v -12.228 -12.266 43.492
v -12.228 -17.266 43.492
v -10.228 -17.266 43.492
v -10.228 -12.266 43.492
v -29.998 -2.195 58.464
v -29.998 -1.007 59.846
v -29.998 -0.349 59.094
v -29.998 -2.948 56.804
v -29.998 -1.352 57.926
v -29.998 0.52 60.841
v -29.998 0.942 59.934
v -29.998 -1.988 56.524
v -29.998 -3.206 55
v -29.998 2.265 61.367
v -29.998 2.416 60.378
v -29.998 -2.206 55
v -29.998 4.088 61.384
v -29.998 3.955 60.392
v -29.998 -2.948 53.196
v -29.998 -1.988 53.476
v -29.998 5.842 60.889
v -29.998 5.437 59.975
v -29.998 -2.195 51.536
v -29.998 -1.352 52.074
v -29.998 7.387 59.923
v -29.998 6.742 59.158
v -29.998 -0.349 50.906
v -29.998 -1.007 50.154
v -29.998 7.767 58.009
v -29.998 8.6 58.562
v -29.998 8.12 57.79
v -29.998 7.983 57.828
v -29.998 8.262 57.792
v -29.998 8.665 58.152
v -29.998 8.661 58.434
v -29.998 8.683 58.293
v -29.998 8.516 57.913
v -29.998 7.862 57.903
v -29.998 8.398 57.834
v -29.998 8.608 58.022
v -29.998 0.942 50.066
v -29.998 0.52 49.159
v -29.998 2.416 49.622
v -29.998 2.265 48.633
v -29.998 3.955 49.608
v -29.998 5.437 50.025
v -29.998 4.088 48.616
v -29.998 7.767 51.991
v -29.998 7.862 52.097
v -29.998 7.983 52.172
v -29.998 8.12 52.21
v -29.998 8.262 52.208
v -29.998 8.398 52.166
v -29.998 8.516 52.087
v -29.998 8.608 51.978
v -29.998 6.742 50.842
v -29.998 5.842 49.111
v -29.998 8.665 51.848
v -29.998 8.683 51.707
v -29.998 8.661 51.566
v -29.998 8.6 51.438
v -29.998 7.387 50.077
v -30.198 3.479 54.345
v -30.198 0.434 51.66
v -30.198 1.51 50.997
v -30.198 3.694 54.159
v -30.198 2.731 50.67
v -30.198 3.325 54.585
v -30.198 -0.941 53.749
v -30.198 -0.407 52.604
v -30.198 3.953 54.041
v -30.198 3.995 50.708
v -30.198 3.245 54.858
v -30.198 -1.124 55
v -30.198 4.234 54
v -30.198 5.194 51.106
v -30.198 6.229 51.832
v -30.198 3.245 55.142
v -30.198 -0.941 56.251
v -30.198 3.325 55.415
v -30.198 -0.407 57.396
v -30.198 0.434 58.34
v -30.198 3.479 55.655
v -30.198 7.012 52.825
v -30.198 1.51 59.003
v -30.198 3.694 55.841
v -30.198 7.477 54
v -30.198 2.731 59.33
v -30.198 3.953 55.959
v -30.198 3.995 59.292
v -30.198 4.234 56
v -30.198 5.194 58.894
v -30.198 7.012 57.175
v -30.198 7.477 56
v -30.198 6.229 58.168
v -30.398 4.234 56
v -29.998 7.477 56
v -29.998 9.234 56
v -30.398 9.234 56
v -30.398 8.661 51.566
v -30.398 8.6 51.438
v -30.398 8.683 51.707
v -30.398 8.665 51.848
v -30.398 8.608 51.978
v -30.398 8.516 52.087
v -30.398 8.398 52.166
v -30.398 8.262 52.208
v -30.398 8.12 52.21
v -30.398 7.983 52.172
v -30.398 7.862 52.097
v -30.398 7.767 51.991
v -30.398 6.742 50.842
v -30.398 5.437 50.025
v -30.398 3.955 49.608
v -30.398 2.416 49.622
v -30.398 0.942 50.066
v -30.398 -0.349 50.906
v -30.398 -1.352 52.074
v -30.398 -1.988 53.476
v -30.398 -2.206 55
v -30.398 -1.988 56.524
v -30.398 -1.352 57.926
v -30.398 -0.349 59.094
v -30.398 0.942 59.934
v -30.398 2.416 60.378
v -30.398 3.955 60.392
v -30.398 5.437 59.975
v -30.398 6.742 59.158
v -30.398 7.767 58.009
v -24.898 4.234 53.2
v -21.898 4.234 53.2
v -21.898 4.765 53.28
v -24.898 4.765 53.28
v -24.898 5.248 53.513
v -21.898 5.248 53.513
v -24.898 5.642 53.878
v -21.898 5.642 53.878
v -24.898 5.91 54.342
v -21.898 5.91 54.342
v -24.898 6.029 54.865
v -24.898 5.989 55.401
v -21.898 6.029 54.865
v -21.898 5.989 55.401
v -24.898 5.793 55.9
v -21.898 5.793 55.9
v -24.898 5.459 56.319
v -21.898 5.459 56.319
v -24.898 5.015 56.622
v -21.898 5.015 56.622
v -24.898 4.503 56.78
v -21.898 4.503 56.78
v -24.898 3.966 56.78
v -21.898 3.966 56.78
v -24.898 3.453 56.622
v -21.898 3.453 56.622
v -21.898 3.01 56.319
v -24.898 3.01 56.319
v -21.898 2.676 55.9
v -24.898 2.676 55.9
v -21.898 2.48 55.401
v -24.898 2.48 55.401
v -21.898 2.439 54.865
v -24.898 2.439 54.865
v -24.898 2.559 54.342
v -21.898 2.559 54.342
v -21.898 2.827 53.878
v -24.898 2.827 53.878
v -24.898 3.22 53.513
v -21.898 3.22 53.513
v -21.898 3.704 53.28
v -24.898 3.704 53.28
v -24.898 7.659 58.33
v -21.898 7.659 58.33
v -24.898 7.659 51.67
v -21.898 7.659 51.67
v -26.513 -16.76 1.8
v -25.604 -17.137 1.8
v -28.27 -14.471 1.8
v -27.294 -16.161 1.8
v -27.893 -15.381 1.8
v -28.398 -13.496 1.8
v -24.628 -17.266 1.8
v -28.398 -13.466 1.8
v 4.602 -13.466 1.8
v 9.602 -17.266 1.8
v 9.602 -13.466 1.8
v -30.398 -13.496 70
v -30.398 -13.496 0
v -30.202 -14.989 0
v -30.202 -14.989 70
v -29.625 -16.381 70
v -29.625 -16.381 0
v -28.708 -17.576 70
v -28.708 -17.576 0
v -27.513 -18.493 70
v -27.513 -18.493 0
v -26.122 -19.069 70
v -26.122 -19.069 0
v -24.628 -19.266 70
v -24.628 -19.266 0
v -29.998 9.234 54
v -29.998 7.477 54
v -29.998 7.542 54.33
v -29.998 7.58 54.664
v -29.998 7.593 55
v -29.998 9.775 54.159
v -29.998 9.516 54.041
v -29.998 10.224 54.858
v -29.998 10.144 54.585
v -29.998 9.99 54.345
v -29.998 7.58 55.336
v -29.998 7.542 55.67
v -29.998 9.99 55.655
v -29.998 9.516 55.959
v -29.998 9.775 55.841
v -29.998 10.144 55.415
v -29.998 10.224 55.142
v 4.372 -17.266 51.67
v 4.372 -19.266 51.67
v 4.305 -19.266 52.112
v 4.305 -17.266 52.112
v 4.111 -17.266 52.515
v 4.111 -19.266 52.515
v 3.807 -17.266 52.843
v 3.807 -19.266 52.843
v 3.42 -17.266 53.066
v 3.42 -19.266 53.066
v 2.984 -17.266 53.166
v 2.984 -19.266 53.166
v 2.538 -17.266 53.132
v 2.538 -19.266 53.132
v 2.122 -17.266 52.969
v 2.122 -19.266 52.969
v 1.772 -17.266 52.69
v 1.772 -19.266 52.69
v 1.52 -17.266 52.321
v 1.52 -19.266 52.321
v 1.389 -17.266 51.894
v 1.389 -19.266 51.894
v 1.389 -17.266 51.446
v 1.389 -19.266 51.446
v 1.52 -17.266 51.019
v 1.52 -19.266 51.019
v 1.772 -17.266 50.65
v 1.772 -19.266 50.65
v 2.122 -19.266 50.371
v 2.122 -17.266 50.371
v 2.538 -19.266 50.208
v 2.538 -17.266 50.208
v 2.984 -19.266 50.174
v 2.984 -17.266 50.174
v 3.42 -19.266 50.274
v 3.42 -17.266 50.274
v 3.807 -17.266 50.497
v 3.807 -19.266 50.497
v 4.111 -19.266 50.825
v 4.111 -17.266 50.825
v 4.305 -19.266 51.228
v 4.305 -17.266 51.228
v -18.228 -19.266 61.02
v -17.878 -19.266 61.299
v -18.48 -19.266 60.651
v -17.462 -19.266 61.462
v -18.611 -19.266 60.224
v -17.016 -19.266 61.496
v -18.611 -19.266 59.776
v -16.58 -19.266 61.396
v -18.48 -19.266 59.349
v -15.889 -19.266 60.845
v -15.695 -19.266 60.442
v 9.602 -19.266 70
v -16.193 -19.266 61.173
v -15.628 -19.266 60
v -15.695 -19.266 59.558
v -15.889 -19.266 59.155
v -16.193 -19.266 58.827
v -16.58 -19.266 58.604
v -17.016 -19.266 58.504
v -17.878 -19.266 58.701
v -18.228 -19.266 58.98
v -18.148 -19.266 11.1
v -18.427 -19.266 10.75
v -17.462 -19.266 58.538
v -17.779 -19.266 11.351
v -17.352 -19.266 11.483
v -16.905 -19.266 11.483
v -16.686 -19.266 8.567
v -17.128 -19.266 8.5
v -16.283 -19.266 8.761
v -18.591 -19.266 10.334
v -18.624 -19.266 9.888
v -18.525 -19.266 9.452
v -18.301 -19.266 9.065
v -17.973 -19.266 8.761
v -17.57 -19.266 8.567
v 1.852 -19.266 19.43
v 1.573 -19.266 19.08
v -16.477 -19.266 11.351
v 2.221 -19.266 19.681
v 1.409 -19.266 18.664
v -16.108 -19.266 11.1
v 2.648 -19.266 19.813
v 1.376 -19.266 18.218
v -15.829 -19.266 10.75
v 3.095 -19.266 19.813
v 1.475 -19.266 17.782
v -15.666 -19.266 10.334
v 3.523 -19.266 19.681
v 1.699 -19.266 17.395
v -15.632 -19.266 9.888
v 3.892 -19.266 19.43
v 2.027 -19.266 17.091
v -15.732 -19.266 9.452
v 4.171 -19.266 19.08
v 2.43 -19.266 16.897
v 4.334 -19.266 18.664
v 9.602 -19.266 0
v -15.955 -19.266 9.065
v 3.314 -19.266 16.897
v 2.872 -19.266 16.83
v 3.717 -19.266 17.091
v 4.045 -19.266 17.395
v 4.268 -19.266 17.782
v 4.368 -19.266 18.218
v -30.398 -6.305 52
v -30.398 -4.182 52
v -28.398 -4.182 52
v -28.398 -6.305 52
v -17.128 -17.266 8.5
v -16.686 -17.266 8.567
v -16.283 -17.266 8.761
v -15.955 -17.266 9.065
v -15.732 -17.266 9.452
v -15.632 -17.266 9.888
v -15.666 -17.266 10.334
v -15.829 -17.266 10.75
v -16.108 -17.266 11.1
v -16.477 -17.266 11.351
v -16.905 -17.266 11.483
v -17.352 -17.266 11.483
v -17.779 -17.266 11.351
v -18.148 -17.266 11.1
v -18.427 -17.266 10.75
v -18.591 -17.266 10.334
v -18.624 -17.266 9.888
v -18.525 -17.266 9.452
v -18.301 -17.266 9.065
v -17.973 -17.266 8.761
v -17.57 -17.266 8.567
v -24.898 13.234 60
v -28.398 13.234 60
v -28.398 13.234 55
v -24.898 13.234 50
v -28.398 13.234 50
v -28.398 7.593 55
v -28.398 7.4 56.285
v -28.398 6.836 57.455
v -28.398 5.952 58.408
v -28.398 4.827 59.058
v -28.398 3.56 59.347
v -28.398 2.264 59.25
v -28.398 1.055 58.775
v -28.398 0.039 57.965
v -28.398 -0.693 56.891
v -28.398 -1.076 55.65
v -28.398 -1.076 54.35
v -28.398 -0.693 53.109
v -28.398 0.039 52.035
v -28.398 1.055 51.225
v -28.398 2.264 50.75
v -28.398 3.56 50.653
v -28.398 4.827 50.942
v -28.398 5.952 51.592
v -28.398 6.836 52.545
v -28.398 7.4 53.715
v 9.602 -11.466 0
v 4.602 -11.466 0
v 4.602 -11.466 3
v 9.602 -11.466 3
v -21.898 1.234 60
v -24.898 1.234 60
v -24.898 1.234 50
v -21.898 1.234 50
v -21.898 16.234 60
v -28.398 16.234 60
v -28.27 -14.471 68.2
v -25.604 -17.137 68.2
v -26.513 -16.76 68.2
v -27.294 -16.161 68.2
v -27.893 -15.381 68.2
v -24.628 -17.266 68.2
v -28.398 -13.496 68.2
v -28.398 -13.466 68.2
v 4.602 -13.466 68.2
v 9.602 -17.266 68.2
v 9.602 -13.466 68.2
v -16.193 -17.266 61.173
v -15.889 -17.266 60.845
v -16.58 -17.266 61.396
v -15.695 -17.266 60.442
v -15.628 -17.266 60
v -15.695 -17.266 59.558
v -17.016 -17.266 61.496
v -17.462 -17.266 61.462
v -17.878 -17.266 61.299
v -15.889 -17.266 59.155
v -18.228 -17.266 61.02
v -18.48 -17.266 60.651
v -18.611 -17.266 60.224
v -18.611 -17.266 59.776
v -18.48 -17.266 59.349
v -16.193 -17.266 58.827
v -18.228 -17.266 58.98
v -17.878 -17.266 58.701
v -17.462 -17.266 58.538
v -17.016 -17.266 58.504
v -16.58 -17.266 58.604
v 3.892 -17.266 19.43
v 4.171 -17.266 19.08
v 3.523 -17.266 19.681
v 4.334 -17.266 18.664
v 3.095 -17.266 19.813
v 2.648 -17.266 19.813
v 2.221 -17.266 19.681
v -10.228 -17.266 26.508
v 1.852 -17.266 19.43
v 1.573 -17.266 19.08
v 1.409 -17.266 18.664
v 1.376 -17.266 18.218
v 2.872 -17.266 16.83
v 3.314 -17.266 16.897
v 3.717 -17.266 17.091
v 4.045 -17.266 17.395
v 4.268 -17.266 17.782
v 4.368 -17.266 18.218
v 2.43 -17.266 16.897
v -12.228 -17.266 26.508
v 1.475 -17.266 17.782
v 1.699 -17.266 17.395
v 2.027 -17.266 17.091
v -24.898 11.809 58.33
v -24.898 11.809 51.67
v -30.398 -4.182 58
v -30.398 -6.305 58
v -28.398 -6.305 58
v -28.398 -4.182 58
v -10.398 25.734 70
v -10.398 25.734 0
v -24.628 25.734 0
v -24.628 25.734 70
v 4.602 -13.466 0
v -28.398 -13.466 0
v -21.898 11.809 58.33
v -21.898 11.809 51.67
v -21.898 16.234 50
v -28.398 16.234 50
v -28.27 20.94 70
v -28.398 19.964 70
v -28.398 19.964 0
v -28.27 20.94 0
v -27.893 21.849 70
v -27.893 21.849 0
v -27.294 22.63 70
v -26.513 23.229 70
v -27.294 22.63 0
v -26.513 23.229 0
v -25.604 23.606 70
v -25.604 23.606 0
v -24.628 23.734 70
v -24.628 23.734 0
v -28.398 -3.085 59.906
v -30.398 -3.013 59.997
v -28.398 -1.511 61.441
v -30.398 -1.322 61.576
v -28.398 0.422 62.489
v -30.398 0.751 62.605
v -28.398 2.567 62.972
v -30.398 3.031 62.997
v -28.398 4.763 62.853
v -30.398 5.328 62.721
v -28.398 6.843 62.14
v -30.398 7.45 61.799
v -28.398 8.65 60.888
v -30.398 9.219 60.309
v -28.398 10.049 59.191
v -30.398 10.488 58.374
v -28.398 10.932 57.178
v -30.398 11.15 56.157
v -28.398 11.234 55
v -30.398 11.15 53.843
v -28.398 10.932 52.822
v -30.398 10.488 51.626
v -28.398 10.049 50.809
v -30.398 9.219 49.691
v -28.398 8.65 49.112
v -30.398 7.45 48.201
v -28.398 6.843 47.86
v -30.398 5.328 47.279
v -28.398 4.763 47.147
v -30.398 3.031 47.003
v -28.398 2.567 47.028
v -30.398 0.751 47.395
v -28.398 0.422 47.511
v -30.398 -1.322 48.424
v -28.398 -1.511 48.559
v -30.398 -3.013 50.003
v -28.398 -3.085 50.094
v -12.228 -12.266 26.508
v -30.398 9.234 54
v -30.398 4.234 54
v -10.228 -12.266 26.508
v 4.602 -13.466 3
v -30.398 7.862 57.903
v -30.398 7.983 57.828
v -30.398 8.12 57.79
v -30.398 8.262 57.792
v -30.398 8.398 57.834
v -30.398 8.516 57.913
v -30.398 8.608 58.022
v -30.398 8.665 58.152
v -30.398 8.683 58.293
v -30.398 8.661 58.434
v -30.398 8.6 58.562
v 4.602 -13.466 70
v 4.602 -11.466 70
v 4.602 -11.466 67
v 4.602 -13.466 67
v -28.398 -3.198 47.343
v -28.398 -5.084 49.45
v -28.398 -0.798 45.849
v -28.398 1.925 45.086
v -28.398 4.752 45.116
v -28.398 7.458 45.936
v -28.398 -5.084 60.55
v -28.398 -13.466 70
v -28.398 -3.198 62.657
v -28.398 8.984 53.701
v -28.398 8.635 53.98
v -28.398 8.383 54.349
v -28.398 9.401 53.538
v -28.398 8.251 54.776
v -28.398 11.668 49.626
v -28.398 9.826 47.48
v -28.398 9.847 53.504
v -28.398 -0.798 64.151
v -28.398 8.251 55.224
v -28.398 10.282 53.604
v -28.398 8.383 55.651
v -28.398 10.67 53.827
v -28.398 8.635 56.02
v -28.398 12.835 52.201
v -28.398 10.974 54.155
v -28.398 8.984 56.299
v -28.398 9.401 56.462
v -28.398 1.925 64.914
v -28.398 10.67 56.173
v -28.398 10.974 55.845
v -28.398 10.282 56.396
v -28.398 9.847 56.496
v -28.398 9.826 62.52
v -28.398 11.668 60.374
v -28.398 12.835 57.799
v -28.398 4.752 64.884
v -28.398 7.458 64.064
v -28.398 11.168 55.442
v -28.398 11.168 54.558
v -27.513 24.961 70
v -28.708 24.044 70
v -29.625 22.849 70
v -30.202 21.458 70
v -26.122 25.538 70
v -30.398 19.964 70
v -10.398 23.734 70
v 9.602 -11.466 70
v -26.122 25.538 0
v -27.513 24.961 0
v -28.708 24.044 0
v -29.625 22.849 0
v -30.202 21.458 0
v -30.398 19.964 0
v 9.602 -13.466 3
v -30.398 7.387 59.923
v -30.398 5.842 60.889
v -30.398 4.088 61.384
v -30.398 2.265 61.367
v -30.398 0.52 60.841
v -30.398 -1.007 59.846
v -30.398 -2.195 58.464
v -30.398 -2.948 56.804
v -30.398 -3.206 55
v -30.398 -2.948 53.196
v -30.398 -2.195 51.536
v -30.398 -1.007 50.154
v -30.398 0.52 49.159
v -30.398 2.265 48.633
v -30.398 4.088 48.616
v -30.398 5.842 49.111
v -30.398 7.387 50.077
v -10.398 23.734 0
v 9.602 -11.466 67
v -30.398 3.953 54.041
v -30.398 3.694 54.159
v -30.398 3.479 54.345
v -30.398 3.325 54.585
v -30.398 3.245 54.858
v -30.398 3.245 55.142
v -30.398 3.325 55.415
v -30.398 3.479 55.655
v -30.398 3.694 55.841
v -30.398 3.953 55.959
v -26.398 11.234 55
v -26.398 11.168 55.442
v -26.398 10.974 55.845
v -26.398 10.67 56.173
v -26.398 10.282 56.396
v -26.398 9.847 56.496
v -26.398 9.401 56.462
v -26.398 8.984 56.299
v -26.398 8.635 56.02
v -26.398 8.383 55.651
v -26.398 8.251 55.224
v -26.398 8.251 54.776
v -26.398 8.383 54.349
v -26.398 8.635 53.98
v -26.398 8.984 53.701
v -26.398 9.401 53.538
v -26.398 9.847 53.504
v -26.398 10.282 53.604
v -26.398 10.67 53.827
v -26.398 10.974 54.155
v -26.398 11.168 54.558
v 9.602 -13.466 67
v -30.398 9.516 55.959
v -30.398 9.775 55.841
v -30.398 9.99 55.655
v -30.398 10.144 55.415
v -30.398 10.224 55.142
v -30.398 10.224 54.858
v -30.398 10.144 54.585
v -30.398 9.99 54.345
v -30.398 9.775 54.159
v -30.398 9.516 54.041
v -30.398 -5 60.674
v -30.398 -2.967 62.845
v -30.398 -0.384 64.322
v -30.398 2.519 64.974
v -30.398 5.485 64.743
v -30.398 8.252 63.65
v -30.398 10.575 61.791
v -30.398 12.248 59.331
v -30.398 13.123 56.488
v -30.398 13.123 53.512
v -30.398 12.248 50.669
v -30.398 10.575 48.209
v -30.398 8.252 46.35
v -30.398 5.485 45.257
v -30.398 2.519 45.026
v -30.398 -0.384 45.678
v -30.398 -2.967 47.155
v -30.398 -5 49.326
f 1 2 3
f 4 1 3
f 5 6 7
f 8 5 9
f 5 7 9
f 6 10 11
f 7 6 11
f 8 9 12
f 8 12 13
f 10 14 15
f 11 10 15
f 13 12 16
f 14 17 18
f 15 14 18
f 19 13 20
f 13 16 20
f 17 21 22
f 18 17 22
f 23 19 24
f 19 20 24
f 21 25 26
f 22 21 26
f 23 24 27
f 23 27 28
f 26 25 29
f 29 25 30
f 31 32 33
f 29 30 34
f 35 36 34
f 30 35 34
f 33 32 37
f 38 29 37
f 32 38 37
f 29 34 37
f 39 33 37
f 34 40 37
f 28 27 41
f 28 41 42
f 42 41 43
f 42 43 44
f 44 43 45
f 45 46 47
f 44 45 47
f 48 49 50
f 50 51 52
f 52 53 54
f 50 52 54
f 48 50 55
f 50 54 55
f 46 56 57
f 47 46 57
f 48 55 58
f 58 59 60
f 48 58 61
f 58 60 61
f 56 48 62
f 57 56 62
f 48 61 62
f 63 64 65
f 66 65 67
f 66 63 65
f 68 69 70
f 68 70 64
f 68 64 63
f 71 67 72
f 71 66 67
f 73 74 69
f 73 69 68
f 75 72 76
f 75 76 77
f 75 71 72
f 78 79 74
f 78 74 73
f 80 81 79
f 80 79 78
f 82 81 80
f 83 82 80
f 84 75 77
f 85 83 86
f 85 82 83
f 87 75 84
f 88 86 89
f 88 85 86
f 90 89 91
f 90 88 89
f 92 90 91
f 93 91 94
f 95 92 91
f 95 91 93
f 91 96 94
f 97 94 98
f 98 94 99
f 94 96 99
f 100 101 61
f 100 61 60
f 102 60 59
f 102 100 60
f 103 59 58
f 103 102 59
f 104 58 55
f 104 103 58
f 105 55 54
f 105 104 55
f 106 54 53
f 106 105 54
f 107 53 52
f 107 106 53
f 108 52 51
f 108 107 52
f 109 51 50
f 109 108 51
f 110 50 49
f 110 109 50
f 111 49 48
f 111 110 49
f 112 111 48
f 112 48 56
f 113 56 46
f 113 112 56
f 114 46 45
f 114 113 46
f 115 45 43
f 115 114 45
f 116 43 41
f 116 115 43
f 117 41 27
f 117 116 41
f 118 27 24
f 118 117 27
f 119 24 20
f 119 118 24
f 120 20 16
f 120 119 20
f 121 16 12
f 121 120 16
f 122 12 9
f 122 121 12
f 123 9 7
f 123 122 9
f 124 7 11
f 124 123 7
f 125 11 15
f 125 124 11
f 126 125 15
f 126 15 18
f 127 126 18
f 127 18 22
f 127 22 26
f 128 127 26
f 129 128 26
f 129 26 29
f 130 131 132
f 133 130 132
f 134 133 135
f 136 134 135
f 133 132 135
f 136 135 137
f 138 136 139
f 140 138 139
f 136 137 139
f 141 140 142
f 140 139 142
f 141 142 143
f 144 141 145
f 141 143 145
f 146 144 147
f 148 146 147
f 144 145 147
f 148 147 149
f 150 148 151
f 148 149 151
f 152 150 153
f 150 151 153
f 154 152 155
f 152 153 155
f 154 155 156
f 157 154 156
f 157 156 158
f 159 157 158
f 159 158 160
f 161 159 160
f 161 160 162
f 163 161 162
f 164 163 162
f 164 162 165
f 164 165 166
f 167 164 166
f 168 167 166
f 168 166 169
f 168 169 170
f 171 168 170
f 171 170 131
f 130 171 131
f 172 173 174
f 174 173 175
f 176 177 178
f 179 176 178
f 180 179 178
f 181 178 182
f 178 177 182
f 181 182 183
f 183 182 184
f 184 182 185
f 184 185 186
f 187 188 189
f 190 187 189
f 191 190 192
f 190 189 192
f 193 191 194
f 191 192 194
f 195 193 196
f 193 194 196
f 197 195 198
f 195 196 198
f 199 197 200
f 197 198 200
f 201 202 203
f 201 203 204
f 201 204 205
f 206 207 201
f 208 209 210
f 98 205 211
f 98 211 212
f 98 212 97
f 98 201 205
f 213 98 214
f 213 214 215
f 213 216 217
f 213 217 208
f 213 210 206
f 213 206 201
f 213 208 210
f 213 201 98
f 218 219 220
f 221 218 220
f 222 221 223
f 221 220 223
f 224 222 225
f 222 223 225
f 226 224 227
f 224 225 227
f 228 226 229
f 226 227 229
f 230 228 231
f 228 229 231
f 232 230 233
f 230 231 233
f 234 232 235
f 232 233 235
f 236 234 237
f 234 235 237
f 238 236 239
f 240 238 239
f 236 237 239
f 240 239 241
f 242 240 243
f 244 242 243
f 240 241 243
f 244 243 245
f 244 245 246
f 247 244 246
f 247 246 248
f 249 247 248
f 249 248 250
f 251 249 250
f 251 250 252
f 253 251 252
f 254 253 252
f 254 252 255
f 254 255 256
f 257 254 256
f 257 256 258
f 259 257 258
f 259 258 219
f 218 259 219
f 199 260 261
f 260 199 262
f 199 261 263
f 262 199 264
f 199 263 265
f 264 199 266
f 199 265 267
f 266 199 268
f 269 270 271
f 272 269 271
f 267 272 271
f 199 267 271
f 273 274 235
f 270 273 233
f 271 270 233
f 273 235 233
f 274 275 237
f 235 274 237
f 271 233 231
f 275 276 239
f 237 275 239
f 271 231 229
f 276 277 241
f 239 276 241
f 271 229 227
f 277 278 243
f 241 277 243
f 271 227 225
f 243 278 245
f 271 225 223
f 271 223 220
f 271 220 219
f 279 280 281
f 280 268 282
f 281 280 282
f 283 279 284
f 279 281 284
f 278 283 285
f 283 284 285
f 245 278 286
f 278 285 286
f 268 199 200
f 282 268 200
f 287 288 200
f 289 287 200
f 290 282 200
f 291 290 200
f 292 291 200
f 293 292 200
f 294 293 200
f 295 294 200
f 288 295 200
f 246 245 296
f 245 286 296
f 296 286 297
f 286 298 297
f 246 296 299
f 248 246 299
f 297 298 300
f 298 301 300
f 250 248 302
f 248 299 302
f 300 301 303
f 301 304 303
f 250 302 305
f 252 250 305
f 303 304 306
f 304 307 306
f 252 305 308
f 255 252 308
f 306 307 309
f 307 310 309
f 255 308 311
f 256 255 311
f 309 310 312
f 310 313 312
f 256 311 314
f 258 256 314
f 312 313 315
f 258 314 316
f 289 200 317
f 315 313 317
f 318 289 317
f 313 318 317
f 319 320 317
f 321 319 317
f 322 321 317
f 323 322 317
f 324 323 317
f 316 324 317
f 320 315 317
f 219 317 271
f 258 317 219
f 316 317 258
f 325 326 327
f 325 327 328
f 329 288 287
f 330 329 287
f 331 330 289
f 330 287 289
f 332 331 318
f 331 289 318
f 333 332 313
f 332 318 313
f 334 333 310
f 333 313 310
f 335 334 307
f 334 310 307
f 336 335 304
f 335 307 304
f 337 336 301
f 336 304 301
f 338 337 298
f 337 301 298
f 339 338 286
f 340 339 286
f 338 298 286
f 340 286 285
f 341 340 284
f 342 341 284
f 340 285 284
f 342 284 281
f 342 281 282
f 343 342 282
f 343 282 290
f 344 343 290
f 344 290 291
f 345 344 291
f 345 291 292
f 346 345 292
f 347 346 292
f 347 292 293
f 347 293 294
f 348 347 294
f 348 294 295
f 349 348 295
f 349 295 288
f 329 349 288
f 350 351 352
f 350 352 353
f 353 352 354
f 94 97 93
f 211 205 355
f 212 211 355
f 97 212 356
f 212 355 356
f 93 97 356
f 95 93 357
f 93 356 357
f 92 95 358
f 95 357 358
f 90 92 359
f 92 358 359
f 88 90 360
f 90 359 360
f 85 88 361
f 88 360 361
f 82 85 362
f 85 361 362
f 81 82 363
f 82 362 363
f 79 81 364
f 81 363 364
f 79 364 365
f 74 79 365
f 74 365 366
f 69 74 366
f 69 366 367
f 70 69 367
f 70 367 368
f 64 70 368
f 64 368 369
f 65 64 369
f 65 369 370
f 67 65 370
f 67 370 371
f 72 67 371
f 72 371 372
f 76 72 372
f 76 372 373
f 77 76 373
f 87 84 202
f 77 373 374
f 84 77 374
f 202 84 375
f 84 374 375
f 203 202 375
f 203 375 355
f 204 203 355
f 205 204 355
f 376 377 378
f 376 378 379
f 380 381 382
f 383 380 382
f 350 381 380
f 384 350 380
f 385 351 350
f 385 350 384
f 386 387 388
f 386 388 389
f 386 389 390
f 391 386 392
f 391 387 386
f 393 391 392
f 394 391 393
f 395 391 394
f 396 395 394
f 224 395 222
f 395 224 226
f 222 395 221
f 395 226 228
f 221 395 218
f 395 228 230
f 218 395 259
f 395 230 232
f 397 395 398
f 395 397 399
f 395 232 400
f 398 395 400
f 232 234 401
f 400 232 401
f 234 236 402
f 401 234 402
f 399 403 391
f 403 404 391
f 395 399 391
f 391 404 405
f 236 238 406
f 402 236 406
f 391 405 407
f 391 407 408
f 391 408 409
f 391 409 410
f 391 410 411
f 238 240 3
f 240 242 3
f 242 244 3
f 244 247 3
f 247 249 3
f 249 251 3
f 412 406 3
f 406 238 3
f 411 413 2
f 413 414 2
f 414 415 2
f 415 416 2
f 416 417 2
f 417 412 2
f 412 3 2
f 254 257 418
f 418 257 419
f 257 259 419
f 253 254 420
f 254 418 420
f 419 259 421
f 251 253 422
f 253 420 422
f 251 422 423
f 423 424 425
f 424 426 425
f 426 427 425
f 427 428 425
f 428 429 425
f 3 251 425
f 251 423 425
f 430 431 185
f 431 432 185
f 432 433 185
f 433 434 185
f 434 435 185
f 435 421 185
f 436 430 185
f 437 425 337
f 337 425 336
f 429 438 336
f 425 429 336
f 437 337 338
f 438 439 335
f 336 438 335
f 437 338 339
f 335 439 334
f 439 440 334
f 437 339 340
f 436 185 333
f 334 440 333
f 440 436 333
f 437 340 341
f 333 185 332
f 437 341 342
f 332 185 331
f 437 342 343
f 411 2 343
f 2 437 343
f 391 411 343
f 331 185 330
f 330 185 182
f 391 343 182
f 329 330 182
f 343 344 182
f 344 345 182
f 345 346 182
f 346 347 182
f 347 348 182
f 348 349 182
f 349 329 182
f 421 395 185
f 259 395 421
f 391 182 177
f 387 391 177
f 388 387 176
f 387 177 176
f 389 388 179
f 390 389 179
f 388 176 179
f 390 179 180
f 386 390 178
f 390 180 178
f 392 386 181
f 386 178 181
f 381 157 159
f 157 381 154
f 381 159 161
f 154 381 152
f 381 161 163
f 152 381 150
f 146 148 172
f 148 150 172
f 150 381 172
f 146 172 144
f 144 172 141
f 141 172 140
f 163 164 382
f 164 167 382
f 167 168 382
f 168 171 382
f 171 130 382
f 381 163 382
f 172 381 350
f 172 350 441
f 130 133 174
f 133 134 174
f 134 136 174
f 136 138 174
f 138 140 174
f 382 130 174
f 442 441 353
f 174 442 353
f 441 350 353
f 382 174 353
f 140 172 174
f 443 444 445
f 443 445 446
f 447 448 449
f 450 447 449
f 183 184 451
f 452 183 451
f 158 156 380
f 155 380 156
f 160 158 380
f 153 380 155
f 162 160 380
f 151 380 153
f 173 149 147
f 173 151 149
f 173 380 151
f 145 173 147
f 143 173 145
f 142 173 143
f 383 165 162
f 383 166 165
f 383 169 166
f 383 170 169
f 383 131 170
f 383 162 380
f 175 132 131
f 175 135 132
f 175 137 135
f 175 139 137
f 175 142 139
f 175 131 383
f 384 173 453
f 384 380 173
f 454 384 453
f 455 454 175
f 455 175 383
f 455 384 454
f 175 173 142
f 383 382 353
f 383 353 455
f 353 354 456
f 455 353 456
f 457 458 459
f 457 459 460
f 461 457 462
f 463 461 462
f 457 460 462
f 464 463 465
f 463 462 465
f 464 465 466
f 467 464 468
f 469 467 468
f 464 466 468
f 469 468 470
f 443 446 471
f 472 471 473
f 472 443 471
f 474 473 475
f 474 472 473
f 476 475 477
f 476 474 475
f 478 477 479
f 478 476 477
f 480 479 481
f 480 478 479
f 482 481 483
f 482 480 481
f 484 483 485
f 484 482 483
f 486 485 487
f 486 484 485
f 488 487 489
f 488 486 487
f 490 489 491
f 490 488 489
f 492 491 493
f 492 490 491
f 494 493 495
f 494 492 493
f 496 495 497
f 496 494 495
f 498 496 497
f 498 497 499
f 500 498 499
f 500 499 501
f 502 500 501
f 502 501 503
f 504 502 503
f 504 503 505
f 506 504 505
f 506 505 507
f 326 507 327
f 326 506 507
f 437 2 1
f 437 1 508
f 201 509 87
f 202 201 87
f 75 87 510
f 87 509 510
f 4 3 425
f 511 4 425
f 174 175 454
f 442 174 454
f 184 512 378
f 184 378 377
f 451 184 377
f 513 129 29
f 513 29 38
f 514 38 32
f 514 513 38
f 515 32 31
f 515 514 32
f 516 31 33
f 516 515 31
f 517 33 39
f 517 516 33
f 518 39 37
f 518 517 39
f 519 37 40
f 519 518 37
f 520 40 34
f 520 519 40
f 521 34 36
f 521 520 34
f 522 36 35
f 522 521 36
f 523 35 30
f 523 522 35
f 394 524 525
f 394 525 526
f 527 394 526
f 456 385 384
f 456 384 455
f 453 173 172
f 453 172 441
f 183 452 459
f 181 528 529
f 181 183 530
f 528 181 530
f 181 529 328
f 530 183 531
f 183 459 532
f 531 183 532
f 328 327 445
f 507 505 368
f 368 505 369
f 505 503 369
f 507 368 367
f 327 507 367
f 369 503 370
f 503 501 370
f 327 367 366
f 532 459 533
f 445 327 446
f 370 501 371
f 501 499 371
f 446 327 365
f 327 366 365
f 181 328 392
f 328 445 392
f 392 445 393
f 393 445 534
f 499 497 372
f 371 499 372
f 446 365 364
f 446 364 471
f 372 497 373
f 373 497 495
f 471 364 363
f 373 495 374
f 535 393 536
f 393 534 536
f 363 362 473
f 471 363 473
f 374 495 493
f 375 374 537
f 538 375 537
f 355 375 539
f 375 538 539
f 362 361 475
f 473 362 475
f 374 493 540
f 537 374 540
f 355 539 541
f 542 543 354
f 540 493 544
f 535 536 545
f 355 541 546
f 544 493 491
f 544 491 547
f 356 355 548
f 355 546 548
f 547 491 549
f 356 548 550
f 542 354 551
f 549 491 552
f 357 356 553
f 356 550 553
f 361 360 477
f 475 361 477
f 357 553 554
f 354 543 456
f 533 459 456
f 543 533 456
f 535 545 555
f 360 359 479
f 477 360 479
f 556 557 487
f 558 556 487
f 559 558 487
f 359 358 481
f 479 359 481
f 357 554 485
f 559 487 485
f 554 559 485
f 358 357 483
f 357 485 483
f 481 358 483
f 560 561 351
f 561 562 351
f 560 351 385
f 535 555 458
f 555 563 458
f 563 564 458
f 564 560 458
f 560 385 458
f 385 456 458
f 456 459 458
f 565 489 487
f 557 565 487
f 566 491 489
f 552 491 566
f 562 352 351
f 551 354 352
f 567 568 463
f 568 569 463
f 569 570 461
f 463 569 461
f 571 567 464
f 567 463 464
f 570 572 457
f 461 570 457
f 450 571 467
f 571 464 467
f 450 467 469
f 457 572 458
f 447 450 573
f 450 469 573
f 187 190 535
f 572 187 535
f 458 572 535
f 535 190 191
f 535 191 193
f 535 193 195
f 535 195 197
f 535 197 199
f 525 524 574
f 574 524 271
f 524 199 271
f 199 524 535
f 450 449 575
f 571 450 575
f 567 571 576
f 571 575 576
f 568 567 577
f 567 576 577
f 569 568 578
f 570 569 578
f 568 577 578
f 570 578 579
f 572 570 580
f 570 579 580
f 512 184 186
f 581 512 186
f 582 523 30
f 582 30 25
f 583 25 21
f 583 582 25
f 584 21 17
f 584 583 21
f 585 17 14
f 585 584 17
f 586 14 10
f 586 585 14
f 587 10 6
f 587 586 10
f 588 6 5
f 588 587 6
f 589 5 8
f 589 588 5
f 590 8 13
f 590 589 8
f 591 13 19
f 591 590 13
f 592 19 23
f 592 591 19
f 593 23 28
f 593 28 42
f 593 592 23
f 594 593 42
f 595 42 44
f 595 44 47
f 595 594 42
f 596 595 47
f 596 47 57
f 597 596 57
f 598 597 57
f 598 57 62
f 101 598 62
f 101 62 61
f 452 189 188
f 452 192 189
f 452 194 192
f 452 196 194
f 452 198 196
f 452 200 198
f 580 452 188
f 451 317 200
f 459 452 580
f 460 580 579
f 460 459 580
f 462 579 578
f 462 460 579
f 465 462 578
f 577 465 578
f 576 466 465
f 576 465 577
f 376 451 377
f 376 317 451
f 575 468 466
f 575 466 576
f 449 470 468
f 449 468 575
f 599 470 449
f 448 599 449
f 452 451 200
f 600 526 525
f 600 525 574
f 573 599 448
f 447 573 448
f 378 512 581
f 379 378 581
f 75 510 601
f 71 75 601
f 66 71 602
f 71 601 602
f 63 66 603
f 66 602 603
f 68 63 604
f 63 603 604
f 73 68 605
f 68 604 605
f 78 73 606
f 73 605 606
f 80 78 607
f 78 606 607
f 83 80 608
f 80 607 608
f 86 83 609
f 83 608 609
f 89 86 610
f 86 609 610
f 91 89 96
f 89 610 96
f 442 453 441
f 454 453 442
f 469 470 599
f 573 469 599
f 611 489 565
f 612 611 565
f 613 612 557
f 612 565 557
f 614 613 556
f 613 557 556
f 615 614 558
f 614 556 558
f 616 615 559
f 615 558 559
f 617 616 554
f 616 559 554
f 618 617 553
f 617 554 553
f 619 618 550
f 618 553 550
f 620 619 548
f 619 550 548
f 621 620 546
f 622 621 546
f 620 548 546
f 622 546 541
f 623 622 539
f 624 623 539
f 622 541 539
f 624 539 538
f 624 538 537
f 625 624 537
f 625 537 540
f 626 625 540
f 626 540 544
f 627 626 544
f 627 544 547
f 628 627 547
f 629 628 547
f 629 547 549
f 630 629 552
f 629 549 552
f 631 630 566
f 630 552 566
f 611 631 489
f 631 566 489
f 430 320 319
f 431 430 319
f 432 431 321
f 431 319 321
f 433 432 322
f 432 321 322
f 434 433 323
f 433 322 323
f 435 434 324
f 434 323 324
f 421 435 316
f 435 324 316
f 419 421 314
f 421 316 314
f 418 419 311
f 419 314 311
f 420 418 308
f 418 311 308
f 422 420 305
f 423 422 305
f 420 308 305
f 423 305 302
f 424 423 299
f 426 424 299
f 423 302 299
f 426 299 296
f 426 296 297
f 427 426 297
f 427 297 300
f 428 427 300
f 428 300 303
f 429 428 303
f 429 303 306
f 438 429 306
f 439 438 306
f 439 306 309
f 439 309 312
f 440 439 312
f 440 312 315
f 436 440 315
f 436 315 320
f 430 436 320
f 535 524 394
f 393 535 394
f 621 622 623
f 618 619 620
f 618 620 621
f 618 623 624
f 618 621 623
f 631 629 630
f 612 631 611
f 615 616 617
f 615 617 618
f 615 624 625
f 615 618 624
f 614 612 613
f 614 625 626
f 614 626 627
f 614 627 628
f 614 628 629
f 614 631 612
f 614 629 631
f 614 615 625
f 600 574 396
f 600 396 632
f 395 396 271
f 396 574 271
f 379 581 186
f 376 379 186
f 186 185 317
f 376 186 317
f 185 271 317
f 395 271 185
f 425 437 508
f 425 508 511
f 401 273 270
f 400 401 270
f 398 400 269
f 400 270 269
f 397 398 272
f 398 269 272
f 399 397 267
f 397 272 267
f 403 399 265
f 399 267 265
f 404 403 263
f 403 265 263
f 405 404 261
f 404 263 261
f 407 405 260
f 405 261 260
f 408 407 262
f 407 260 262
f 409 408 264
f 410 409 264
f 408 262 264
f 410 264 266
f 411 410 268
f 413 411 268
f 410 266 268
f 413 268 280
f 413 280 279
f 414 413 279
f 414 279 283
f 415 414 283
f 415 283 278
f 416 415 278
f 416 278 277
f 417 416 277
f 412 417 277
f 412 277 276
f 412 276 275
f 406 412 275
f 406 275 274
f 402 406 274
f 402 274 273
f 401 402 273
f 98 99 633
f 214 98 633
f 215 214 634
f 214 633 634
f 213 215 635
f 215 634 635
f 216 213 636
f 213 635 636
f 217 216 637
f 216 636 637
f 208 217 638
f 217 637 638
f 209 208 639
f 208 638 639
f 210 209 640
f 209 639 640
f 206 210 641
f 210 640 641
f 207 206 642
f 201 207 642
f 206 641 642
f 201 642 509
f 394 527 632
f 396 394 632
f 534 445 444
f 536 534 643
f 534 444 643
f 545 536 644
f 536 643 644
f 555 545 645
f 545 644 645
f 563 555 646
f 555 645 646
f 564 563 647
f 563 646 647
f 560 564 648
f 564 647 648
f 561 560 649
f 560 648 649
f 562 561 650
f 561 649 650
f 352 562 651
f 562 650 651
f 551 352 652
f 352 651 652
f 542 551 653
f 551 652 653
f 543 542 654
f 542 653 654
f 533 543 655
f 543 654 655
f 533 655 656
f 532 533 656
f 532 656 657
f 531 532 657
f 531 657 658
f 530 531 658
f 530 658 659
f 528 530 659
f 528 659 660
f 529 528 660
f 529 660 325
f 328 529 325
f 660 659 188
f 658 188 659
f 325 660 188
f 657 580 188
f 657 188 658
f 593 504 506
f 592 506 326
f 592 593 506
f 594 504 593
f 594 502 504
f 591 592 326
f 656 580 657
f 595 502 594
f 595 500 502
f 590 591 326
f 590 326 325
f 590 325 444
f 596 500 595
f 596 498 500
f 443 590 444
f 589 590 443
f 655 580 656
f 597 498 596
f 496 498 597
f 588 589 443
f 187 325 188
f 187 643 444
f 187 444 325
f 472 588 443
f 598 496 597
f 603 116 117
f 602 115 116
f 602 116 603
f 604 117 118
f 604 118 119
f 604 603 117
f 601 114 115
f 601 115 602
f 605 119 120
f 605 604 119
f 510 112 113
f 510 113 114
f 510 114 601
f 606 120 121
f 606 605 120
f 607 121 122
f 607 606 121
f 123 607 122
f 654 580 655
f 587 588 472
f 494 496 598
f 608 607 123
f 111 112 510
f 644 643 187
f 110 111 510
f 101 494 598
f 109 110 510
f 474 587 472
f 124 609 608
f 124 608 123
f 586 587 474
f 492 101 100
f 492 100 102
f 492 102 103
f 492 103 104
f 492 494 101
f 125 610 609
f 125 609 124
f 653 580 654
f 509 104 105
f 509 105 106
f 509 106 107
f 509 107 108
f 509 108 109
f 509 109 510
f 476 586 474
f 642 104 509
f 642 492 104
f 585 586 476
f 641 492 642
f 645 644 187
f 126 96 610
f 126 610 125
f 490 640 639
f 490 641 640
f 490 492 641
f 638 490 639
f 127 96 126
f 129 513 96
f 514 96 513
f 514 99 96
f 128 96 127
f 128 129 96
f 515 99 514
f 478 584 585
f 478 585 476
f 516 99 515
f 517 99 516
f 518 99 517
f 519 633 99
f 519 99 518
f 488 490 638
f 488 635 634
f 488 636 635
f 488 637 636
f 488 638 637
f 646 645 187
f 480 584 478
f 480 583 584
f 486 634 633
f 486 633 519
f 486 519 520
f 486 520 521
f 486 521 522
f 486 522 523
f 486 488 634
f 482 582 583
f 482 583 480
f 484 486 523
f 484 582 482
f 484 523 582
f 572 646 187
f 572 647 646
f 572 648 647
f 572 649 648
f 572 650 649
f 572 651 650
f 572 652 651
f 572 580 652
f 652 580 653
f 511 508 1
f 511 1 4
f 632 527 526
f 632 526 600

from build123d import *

# Parameters (mm, degrees)
BOSS_EXTRUDE1_DEPTH = 70
BOSS_EXTRUDE3_REACH = 86.63
SKETCH3_W           = 1.8
SKETCH3_H           = 3.8
SKETCH4_W           = 5
SKETCH4_H           = 3
BOSS_EXTRUDE4_DEPTH = 2
CUT_EXTRUDE1_REACH  = 90.595
SKETCH5_R           = 1.5
SKETCH7_R           = 10
CUT_EXTRUDE2_DEPTH  = 85.630140132
BOSS_EXTRUDE5_DEPTH = 2
SKETCH10_R          = 4.358893906
CUT_EXTRUDE3_DEPTH  = 1.8
SKETCH9_R           = 1.5
BOSS_EXTRUDE6_DEPTH = 2
SKETCH11_W          = 10
SKETCH11_H          = 3
BOSS_EXTRUDE7_DEPTH = 3.5
SKETCH12_W          = 10
SKETCH12_H          = 15
BOSS_EXTRUDE8_DEPTH = 3
CUT_EXTRUDE4_REACH  = 82.96
SKETCH13_W          = 6.66
SKETCH13_H          = 4.15
CUT_EXTRUDE5_REACH  = 82.96
SKETCH15_R          = 1.8
CUT_EXTRUDE6_DEPTH  = 0.4
SKETCH17_W          = 2
SKETCH17_H          = 16.984057064
BOSS_EXTRUDE9_DEPTH = 5


with BuildPart() as part:
    # Sketch1 → Boss-Extrude1 (new body)
    with BuildSketch(Plane.XY):
        with BuildLine():
            Line((-30.398230088, 19.964424779), (-30.398230088, -13.495575221))
            ThreePointArc((-30.398230088, -13.495575221), (-28.708236216, -17.575581349), (-24.628230088, -19.265575221))
            Line((-24.628230088, -19.265575221), (9.601769912, -19.265575221))
            Line((9.601769912, -19.265575221), (9.601769912, -17.265575221))
            Line((9.601769912, -17.265575221), (-24.628230088, -17.265575221))
            ThreePointArc((-24.628230088, -17.265575221), (-27.294022654, -16.161367786), (-28.398230088, -13.495575221))
            Line((-28.398230088, -13.495575221), (-28.398230088, 19.964424779))
            ThreePointArc((-28.398230088, 19.964424779), (-27.294022654, 22.630217344), (-24.628230088, 23.734424779))
            Line((-24.628230088, 23.734424779), (-10.398230088, 23.734424779))
            Line((-10.398230088, 23.734424779), (-10.398230088, 25.734424779))
            Line((-10.398230088, 25.734424779), (-24.628230088, 25.734424779))
            ThreePointArc((-24.628230088, 25.734424779), (-28.708236216, 24.044430906), (-30.398230088, 19.964424779))
        make_face()
    extrude(amount=BOSS_EXTRUDE1_DEPTH)

    # Sketch3 → Boss-Extrude3 (add, up to next)
    with BuildSketch(Plane(origin=(9.601769912, 0, 0), x_dir=(0, 0, -1), z_dir=(1, 0, 0)), mode=Mode.PRIVATE) as boss_extrude3_sk1:
        with Locations((-69.1, -15.365575221)):
            Rectangle(SKETCH3_W, SKETCH3_H)
    boss_extrude3_tool1 = extrude(boss_extrude3_sk1.sketch, amount=-BOSS_EXTRUDE3_REACH, mode=Mode.PRIVATE) - part.part
    # Sketch3 → Boss-Extrude3 (add, up to next)
    with BuildSketch(Plane(origin=(9.601769912, 0, 0), x_dir=(0, 0, -1), z_dir=(1, 0, 0)), mode=Mode.PRIVATE) as boss_extrude3_sk2:
        with Locations((-0.9, -15.365575221)):
            Rectangle(SKETCH3_W, SKETCH3_H)
    boss_extrude3_tool2 = extrude(boss_extrude3_sk2.sketch, amount=-BOSS_EXTRUDE3_REACH, mode=Mode.PRIVATE) - part.part
    add(boss_extrude3_tool1.solids().sort_by_distance((9.60177, -15.365575, 69.1))[0])
    add(boss_extrude3_tool2.solids().sort_by_distance((9.60177, -15.365575, 0.9))[0])

    # Sketch4 → Boss-Extrude4 (add)
    with BuildSketch(Plane(origin=(0, -13.465575221, 0), x_dir=(1, 0, 0), z_dir=(0, 1, 0))):
        with Locations((7.101769912, -68.5)):
            Rectangle(SKETCH4_W, SKETCH4_H)
        with Locations((7.101769912, -1.5)):
            Rectangle(SKETCH4_W, SKETCH4_H)
    extrude(amount=BOSS_EXTRUDE4_DEPTH)

    # Sketch5 → Cut-Extrude1 (cut, up to next)
    with BuildSketch(Plane(origin=(0, -19.265575221, 0), x_dir=(-1, 0, 0), z_dir=(0, -1, 0)), mode=Mode.PRIVATE) as cut_extrude1_sk1:
        with Locations((17.128230088, -60)):
            Circle(SKETCH5_R)
    cut_extrude1_tool1 = extrude(cut_extrude1_sk1.sketch, amount=-CUT_EXTRUDE1_REACH, mode=Mode.PRIVATE) & part.part
    # Sketch5 → Cut-Extrude1 (cut, up to next)
    with BuildSketch(Plane(origin=(0, -19.265575221, 0), x_dir=(-1, 0, 0), z_dir=(0, -1, 0)), mode=Mode.PRIVATE) as cut_extrude1_sk2:
        with Locations((17.128230088, -10)):
            Circle(SKETCH5_R)
    cut_extrude1_tool2 = extrude(cut_extrude1_sk2.sketch, amount=-CUT_EXTRUDE1_REACH, mode=Mode.PRIVATE) & part.part
    # Sketch5 → Cut-Extrude1 (cut, up to next)
    with BuildSketch(Plane(origin=(0, -19.265575221, 0), x_dir=(-1, 0, 0), z_dir=(0, -1, 0)), mode=Mode.PRIVATE) as cut_extrude1_sk3:
        with Locations((-2.871769912, -51.67)):
            Circle(SKETCH5_R)
    cut_extrude1_tool3 = extrude(cut_extrude1_sk3.sketch, amount=-CUT_EXTRUDE1_REACH, mode=Mode.PRIVATE) & part.part
    # Sketch5 → Cut-Extrude1 (cut, up to next)
    with BuildSketch(Plane(origin=(0, -19.265575221, 0), x_dir=(-1, 0, 0), z_dir=(0, -1, 0)), mode=Mode.PRIVATE) as cut_extrude1_sk4:
        with Locations((-2.871769912, -18.33)):
            Circle(SKETCH5_R)
    cut_extrude1_tool4 = extrude(cut_extrude1_sk4.sketch, amount=-CUT_EXTRUDE1_REACH, mode=Mode.PRIVATE) & part.part
    add(cut_extrude1_tool1.solids().sort_by_distance((-17.12823, -19.265575, 60))[0], mode=Mode.SUBTRACT)
    add(cut_extrude1_tool2.solids().sort_by_distance((-17.12823, -19.265575, 10))[0], mode=Mode.SUBTRACT)
    add(cut_extrude1_tool3.solids().sort_by_distance((2.87177, -19.265575, 51.67))[0], mode=Mode.SUBTRACT)
    add(cut_extrude1_tool4.solids().sort_by_distance((2.87177, -19.265575, 18.33))[0], mode=Mode.SUBTRACT)

    # Sketch7 → Cut-Extrude2 (cut, through all)
    with BuildSketch(Plane.ZY.offset(30.398230088)):
        with Locations((55, 3.234424779)):
            Circle(SKETCH7_R)
    extrude(amount=-CUT_EXTRUDE2_DEPTH, mode=Mode.SUBTRACT)

    # Sketch8 → Boss-Extrude5 (add)
    with BuildSketch(Plane.ZY.offset(30.398230088)):
        with BuildLine():
            Line((52, -4.181773708), (52, -6.304967235))
            ThreePointArc((52, -6.304967235), (55, -6.765575221), (58, -6.304967235))
            Line((58, -6.304967235), (58, -4.181773708))
            ThreePointArc((58, -4.181773708), (55, 11.234424779), (52, -4.181773708))
        make_face()
    extrude(amount=-BOSS_EXTRUDE5_DEPTH)

    # Sketch10 → Cut-Extrude3 (cut)
    with BuildSketch(Plane(origin=(-28.398230088, 0, 0), x_dir=(0, 0, -1), z_dir=(1, 0, 0))):
        with Locations((-55, 3.234424779)):
            Circle(SKETCH10_R)
    extrude(amount=-CUT_EXTRUDE3_DEPTH, mode=Mode.SUBTRACT)

    # Sketch9 → Boss-Extrude6 (add)
    with BuildSketch(Plane(origin=(-28.398230088, 0, 0), x_dir=(0, 0, -1), z_dir=(1, 0, 0))):
        with Locations((-55, 9.734424779)):
            Circle(SKETCH9_R)
    extrude(amount=BOSS_EXTRUDE6_DEPTH)

    # Sketch11 → Boss-Extrude7 (add)
    with BuildSketch(Plane(origin=(-28.398230088, 0, 0), x_dir=(0, 0, -1), z_dir=(1, 0, 0))):
        with Locations((-55, 14.734424779)):
            Rectangle(SKETCH11_W, SKETCH11_H)
    extrude(amount=BOSS_EXTRUDE7_DEPTH)

    # Sketch12 → Boss-Extrude8 (add)
    with BuildSketch(Plane(origin=(-24.898230088, 0, 0), x_dir=(0, 0, -1), z_dir=(1, 0, 0))):
        with Locations((-55, 8.734424779)):
            Rectangle(SKETCH12_W, SKETCH12_H)
    extrude(amount=BOSS_EXTRUDE8_DEPTH)

    # Sketch13 → Cut-Extrude4 (cut, up to next)
    with BuildSketch(Plane(origin=(-21.898230088, 0, 0), x_dir=(0, 0, -1), z_dir=(1, 0, 0)), mode=Mode.PRIVATE) as cut_extrude4_sk1:
        with Locations((-55, 9.734424779)):
            Rectangle(SKETCH13_W, SKETCH13_H)
    cut_extrude4_tool1 = extrude(cut_extrude4_sk1.sketch, amount=-CUT_EXTRUDE4_REACH, mode=Mode.PRIVATE) & part.part
    add(cut_extrude4_tool1.solids().sort_by_distance((-21.89823, 9.734425, 55))[0], mode=Mode.SUBTRACT)

    # Sketch15 → Cut-Extrude5 (cut, up to next)
    with BuildSketch(Plane(origin=(-21.898230088, 0, 0), x_dir=(0, 0, -1), z_dir=(1, 0, 0)), mode=Mode.PRIVATE) as cut_extrude5_sk1:
        with Locations((-55, 4.234424779)):
            Circle(SKETCH15_R)
    cut_extrude5_tool1 = extrude(cut_extrude5_sk1.sketch, amount=-CUT_EXTRUDE5_REACH, mode=Mode.PRIVATE) & part.part
    add(cut_extrude5_tool1.solids().sort_by_distance((-21.89823, 4.234425, 55))[0], mode=Mode.SUBTRACT)

    # Sketch16 → Cut-Extrude6 (cut)
    with BuildSketch(Plane.ZY.offset(30.398230088)):
        with BuildLine():
            Line((54, 9.234424779), (54, 4.234424779))
            ThreePointArc((54, 4.234424779), (55, 3.234424779), (56, 4.234424779))
            Line((56, 4.234424779), (56, 9.234424779))
            ThreePointArc((56, 9.234424779), (55, 10.234424779), (54, 9.234424779))
        make_face()
        with BuildLine():
            ThreePointArc((51.990895344, 7.766880364), (55, -2.205967162), (58.009104656, 7.766880364))
            ThreePointArc((58.009104656, 7.766880364), (57.869100871, 8.459988538), (58.562209044, 8.599992323))
            ThreePointArc((58.562209044, 8.599992323), (55, -3.205967162), (51.437790956, 8.599992323))
            ThreePointArc((51.437790956, 8.599992323), (52.130899129, 8.459988538), (51.990895344, 7.766880364))
        make_face()
    extrude(amount=-CUT_EXTRUDE6_DEPTH, mode=Mode.SUBTRACT)

    # Sketch17 → Boss-Extrude9 (add)
    with BuildSketch(Plane(origin=(0, -17.265575221, 0), x_dir=(1, 0, 0), z_dir=(0, 1, 0))):
        with Locations((-11.228230088, -35)):
            Rectangle(SKETCH17_W, SKETCH17_H)
    extrude(amount=BOSS_EXTRUDE9_DEPTH)


solid = part.part
